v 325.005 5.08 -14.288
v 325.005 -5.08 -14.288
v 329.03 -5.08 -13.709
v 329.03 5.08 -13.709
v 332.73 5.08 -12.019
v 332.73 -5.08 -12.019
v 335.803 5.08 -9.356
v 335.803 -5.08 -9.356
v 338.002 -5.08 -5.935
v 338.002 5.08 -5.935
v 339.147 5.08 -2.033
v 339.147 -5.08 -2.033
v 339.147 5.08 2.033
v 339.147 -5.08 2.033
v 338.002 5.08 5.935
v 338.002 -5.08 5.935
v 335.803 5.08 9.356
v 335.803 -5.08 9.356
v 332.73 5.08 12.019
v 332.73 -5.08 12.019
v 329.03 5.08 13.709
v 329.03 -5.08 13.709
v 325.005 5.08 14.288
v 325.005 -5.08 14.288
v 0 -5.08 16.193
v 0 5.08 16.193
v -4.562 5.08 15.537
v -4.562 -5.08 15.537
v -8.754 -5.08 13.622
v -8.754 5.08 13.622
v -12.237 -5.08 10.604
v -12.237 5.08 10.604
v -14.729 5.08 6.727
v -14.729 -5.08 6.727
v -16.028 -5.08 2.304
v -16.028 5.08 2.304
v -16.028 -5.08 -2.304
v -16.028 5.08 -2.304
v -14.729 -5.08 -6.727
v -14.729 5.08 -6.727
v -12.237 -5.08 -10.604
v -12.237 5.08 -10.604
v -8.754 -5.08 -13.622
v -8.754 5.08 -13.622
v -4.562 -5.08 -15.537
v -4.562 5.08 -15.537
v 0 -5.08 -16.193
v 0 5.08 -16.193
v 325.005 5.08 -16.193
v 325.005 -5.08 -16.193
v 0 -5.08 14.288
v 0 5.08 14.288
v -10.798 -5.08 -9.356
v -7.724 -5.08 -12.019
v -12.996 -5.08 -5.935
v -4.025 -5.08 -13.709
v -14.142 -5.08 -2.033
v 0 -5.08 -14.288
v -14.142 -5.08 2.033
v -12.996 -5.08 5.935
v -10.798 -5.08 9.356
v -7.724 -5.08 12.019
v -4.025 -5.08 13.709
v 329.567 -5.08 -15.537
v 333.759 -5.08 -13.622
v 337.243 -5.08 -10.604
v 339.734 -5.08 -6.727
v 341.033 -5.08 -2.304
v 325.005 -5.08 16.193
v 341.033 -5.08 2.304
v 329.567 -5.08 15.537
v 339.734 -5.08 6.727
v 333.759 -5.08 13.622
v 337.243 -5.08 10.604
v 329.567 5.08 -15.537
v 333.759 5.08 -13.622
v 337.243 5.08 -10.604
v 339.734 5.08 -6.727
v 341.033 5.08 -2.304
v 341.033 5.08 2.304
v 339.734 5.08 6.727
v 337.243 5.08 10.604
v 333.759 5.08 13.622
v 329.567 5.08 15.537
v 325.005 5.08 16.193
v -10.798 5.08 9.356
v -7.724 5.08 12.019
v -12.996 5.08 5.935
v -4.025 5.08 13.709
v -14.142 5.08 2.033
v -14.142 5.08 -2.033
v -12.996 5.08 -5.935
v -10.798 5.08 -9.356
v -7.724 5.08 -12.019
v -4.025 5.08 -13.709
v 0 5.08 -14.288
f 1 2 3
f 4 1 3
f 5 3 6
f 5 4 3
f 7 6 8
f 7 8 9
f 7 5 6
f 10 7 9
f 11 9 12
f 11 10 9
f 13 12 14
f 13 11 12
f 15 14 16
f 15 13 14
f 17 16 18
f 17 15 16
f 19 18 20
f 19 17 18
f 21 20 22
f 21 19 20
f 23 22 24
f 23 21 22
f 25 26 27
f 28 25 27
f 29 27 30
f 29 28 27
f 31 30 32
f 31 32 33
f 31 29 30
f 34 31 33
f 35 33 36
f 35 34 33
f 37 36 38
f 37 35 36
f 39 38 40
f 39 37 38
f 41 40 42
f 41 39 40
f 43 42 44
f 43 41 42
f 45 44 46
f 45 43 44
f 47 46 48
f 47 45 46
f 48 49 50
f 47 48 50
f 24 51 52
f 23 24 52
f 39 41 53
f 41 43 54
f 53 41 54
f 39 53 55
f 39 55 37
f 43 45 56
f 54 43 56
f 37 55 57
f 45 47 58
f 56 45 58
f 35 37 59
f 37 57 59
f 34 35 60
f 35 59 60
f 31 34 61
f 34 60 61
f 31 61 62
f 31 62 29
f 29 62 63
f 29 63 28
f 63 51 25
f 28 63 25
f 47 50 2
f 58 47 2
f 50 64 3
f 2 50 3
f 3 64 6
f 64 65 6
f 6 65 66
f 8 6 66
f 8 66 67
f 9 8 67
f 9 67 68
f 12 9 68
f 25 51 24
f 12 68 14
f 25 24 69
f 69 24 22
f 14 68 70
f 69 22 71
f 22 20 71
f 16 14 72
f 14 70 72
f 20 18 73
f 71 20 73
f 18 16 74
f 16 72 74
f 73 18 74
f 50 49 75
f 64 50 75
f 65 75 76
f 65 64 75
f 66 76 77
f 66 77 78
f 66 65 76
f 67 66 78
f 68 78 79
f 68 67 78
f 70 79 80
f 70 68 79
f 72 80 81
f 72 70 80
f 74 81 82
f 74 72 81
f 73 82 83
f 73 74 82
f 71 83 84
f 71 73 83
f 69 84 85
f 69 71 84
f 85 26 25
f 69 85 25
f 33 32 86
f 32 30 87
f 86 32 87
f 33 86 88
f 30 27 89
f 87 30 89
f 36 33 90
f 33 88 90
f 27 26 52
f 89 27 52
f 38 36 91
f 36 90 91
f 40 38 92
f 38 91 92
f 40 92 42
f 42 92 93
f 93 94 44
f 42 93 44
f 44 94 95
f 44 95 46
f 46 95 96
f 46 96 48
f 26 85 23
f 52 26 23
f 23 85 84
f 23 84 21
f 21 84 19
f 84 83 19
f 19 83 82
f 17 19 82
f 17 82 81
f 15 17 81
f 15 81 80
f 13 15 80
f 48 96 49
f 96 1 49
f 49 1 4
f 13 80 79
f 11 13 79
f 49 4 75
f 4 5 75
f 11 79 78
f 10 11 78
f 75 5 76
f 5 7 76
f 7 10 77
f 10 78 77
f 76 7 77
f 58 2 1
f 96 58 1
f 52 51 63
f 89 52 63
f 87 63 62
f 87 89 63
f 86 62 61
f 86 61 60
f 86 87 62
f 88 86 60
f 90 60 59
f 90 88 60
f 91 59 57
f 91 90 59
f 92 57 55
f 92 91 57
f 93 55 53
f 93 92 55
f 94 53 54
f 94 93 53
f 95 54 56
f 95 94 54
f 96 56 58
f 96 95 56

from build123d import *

# Parameters (mm, degrees)
SKETCH2_W = 1.905
SKETCH2_H = 10.16


with BuildPart() as part:
    # Sweep1: sweep along a path in Sketch1
    with BuildLine(Plane(origin=(0, 0, 0), x_dir=(1, 0, 0), z_dir=(0, 1, 0))) as sweep1_path:
        Line((0, 15.24), (325.005160504, 15.24))
        ThreePointArc((325.005160504, 15.24), (340.245160504, 0), (325.005160504, -15.24))
        Line((325.005160504, -15.24), (0, -15.24))
        ThreePointArc((0, -15.24), (-15.24, 0), (0, 15.24))
    # Sketch2 → Sweep1 (sweep)
    with BuildSketch(Plane(origin=(0, 0, 0), x_dir=(0, 0, -1), z_dir=(1, 0, 0))):
        with Locations((-15.24, 0)):
            Rectangle(SKETCH2_W, SKETCH2_H)
    sweep(path=sweep1_path.line)


solid = part.part
